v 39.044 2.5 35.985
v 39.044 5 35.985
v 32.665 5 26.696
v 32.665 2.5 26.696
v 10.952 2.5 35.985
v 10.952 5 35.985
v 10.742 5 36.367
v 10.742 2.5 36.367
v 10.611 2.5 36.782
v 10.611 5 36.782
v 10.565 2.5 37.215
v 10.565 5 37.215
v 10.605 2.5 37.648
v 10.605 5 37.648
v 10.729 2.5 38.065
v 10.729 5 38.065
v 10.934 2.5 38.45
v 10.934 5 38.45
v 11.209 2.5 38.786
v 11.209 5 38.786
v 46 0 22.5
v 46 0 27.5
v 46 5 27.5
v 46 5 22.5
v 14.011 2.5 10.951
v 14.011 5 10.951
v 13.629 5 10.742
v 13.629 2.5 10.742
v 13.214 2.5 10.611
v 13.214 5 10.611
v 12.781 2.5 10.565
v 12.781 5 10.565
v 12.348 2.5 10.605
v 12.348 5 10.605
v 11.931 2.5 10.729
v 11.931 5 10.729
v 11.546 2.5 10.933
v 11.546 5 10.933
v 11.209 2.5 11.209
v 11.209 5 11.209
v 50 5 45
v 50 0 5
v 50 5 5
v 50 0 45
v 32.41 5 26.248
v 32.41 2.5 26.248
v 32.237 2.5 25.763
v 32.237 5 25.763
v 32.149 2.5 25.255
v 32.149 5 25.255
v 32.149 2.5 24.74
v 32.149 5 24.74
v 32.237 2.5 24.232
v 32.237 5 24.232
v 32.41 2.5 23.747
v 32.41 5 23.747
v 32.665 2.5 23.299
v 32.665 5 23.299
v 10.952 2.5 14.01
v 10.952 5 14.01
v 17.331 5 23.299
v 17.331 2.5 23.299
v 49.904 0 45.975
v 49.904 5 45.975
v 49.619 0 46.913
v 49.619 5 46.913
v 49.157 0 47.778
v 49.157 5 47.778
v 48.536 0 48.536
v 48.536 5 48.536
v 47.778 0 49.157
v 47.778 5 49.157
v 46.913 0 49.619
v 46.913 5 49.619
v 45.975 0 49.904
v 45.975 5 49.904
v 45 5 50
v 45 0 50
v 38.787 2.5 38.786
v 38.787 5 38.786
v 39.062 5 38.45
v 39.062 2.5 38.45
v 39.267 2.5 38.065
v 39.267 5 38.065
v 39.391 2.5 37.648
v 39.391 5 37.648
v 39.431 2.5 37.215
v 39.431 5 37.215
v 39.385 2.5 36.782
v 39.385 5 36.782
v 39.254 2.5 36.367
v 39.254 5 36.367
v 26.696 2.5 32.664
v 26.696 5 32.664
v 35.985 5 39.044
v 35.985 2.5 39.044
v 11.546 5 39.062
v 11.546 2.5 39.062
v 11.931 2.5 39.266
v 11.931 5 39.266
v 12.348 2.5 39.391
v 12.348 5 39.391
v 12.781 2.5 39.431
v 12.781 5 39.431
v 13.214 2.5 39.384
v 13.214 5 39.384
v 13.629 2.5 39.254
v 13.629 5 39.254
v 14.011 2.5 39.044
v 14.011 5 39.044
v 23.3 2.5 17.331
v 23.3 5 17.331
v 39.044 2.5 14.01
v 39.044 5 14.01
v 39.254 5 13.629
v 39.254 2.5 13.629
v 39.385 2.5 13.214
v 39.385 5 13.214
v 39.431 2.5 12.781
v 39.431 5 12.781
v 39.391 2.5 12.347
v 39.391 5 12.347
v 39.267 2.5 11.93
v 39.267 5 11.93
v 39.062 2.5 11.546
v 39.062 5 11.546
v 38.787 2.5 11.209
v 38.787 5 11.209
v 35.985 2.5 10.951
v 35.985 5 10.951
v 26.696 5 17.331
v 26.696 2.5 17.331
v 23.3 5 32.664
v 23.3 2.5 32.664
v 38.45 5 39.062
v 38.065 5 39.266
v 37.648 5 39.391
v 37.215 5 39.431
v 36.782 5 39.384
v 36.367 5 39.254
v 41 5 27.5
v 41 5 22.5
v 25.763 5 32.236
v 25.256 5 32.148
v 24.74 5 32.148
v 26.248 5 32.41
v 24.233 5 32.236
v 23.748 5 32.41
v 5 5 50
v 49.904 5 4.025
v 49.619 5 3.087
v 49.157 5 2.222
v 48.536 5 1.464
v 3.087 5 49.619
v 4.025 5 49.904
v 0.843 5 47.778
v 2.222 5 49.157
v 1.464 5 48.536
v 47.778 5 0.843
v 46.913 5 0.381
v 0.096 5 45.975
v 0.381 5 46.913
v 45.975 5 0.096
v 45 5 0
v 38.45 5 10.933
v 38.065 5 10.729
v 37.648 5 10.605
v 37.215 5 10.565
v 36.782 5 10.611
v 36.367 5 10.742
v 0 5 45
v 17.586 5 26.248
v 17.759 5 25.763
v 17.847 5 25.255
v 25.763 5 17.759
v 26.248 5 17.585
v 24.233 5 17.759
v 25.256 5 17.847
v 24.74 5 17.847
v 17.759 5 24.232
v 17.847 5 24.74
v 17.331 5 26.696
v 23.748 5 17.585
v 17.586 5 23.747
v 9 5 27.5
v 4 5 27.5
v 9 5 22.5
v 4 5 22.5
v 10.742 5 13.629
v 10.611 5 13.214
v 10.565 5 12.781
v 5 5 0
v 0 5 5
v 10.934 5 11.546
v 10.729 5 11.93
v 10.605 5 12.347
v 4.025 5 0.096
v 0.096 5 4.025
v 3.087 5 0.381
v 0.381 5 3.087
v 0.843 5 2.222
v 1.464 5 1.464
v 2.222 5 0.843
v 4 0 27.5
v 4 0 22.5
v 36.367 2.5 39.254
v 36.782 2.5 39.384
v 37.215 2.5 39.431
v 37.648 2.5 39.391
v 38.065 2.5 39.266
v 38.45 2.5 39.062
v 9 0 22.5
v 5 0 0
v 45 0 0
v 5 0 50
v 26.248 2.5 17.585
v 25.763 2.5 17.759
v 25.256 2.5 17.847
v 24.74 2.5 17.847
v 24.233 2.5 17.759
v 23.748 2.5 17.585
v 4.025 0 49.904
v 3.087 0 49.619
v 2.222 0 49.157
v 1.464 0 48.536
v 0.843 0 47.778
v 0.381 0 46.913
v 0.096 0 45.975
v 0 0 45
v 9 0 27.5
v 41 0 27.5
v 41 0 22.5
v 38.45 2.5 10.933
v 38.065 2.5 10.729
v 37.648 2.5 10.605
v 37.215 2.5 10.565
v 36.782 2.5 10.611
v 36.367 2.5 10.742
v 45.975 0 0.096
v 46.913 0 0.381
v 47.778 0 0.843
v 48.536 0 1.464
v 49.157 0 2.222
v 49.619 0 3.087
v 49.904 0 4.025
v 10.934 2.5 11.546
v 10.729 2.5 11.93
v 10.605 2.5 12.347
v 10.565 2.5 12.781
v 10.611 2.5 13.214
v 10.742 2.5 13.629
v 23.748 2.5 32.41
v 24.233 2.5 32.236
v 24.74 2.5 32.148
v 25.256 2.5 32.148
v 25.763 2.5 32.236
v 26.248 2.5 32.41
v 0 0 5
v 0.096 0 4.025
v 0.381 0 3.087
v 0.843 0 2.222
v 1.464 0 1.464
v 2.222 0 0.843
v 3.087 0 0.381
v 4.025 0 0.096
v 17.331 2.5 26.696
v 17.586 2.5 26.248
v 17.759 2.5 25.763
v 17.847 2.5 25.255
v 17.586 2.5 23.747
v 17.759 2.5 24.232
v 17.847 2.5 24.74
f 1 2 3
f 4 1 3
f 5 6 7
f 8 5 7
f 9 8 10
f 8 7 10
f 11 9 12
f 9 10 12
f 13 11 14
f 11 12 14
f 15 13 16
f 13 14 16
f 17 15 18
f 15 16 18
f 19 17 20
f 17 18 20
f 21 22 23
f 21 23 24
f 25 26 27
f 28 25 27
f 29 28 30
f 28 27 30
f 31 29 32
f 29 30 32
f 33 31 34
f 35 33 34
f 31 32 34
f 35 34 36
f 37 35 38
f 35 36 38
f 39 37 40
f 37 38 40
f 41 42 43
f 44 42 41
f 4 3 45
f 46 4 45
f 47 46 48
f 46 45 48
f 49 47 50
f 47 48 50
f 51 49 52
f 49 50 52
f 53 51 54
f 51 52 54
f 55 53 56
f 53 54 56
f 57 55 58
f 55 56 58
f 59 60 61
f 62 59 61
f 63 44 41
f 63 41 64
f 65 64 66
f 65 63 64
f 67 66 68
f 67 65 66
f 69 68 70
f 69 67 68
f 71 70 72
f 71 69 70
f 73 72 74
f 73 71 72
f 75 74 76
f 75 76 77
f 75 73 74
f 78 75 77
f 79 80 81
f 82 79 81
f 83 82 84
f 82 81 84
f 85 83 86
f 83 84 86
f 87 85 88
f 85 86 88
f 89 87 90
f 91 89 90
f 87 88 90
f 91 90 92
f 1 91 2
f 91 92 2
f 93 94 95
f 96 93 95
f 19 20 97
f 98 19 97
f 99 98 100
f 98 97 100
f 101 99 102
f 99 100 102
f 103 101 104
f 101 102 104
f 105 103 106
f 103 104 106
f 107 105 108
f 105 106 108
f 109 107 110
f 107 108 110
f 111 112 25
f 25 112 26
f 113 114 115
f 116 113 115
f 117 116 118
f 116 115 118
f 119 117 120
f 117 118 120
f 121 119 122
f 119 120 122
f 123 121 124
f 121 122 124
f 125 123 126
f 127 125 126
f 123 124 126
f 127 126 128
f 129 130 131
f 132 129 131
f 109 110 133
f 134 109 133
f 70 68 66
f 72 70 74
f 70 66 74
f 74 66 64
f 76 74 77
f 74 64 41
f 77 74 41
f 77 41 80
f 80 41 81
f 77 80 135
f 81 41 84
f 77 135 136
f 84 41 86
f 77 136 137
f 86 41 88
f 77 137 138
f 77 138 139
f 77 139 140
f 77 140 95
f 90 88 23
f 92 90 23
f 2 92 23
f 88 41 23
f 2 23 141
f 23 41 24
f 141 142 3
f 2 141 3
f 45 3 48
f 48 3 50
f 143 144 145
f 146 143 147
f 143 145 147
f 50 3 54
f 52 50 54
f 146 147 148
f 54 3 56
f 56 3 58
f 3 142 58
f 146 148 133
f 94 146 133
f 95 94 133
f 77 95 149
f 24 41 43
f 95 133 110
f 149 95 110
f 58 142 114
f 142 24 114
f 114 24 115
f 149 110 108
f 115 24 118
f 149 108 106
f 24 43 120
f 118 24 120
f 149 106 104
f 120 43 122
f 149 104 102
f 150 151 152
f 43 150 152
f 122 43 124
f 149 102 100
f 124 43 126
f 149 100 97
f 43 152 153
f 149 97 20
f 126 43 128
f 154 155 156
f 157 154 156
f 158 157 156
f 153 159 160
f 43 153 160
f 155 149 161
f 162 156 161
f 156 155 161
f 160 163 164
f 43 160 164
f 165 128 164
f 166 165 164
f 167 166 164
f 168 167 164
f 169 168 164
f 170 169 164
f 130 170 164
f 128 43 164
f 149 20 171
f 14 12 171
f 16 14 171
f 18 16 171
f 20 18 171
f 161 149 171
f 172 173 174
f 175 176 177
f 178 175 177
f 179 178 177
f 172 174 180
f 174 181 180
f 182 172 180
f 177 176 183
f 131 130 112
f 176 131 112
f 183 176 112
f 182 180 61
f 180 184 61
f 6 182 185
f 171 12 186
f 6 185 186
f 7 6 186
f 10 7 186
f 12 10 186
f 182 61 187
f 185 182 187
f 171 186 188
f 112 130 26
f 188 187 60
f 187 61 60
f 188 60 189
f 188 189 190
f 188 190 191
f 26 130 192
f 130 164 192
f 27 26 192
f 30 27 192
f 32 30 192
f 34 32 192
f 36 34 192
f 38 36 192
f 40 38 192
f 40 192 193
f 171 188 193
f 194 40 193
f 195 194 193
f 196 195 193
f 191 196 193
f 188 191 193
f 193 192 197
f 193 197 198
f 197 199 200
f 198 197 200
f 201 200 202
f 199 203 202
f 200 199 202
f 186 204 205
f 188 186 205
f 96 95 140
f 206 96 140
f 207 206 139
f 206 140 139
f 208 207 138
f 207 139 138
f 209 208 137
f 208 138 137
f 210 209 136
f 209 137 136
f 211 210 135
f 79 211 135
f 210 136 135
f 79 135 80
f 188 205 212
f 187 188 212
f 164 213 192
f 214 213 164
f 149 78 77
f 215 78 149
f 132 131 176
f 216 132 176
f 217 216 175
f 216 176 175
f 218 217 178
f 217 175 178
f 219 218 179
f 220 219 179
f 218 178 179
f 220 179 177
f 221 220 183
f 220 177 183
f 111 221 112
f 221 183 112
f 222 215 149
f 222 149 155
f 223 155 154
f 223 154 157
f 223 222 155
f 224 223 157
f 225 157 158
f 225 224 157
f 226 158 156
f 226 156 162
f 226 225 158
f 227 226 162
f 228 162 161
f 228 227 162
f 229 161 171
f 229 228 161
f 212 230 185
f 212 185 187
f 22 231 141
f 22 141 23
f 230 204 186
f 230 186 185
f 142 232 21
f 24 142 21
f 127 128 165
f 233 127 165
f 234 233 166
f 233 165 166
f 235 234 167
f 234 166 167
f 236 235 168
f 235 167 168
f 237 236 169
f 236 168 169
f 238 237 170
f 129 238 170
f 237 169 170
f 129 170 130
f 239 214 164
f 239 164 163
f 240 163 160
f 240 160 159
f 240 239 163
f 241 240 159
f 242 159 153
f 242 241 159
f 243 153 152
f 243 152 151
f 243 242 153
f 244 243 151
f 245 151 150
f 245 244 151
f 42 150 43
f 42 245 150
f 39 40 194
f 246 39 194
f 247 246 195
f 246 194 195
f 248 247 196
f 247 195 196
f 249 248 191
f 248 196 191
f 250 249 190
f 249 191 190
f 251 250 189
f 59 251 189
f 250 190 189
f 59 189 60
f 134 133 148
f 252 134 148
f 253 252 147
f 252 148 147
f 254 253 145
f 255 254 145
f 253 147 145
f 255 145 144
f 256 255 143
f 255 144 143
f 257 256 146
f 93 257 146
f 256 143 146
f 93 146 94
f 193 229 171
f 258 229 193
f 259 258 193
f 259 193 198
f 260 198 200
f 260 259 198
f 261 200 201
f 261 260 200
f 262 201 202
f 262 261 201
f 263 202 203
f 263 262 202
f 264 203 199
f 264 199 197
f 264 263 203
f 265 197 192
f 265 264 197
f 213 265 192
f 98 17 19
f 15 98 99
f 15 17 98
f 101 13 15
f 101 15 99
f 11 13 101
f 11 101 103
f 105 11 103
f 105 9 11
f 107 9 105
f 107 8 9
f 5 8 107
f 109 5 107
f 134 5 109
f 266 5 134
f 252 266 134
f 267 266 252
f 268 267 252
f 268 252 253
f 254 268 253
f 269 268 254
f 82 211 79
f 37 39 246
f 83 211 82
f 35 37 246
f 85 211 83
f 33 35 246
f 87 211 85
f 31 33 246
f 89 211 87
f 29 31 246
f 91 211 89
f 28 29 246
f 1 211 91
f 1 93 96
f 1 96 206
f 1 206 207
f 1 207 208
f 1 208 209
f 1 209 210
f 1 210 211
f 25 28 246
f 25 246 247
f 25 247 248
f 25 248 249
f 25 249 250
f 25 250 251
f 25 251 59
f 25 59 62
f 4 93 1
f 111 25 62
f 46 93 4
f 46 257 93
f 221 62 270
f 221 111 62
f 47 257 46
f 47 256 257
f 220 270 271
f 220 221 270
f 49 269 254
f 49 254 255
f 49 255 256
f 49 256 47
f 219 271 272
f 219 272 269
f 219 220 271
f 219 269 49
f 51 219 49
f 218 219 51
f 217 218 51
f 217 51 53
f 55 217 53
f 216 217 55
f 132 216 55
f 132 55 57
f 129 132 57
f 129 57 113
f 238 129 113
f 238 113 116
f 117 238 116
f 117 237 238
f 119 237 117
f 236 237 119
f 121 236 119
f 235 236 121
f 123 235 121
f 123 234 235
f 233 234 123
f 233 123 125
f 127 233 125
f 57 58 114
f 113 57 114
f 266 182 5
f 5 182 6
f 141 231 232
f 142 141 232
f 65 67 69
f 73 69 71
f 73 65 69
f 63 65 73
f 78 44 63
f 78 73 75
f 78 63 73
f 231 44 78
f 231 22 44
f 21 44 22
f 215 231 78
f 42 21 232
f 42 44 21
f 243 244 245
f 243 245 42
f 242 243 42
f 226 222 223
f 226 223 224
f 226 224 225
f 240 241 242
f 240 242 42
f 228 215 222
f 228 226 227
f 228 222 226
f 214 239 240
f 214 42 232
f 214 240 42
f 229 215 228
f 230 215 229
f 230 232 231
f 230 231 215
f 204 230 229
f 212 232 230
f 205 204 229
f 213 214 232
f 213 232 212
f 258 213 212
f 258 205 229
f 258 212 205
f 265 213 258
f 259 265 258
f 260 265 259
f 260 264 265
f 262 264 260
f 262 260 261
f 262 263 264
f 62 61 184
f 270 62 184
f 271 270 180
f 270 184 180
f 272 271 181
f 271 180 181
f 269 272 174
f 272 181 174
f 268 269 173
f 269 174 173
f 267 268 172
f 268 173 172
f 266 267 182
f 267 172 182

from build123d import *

# Parameters (mm, degrees)
SKETCH2_W           = 5
SKETCH2_H           = 5
BOSS_EXTRUDE1_DEPTH = 5
CUT_EXTRUDE1_DEPTH  = 2.5


with BuildPart() as part:
    # Sketch2 → Boss-Extrude1 (new body)
    with BuildSketch(Plane(origin=(0, 0, 0), x_dir=(1, 0, 0), z_dir=(0, 1, 0))):
        with BuildLine():
            Line((5, 0), (45, 0))
            ThreePointArc((45, 0), (48.535533906, -1.464466094), (50, -5))
            Line((50, -5), (50, -45))
            ThreePointArc((50, -45), (48.535533906, -48.535533906), (45, -50))
            Line((45, -50), (5, -50))
            ThreePointArc((5, -50), (1.464466094, -48.535533906), (0, -45))
            Line((0, -45), (0, -5))
            ThreePointArc((0, -5), (1.464466094, -1.464466094), (5, 0))
        make_face()
        with Locations((6.5, -25)):
            Rectangle(SKETCH2_W, SKETCH2_H, mode=Mode.SUBTRACT)
        with Locations((43.5, -25)):
            Rectangle(SKETCH2_W, SKETCH2_H, mode=Mode.SUBTRACT)
    extrude(amount=BOSS_EXTRUDE1_DEPTH)

    # Sketch4 → Cut-Extrude1 (cut)
    with BuildSketch(Plane(origin=(0, 5, 0), x_dir=(1, 0, 0), z_dir=(0, 1, 0))):
        with BuildLine():
            Line((23.299566157, -17.331191341), (14.010613466, -10.951334614))
            ThreePointArc((14.010613466, -10.951334614), (12.563442924, -10.574062008), (11.209455823, -11.209165249))
            ThreePointArc((11.209455823, -11.209165249), (10.574352582, -12.56315235), (10.951625187, -14.010322893))
            Line((10.951625187, -14.010322893), (17.331481915, -23.299275583))
            ThreePointArc((17.331481915, -23.299275583), (17.858572583, -24.997719905), (17.331481915, -26.696164227))
            Line((17.331481915, -26.696164227), (10.951625187, -35.985116918))
            ThreePointArc((10.951625187, -35.985116918), (10.574352582, -37.43228746), (11.209455823, -38.786274561))
            ThreePointArc((11.209455823, -38.786274561), (12.563442924, -39.421377802), (14.010613466, -39.044105197))
            Line((14.010613466, -39.044105197), (23.299566157, -32.664248469))
            ThreePointArc((23.299566157, -32.664248469), (24.998010479, -32.137157801), (26.696454801, -32.664248469))
            Line((26.696454801, -32.664248469), (35.985407491, -39.044105197))
            ThreePointArc((35.985407491, -39.044105197), (37.432578034, -39.421377802), (38.786565135, -38.786274561))
            ThreePointArc((38.786565135, -38.786274561), (39.421668376, -37.43228746), (39.04439577, -35.985116918))
            Line((39.04439577, -35.985116918), (32.664539043, -26.696164227))
            ThreePointArc((32.664539043, -26.696164227), (32.137448374, -24.997719905), (32.664539043, -23.299275583))
            Line((32.664539043, -23.299275583), (39.04439577, -14.010322893))
            ThreePointArc((39.04439577, -14.010322893), (39.421668376, -12.56315235), (38.786565135, -11.209165249))
            ThreePointArc((38.786565135, -11.209165249), (37.432578034, -10.574062008), (35.985407491, -10.951334614))
            Line((35.985407491, -10.951334614), (26.696454801, -17.331191341))
            ThreePointArc((26.696454801, -17.331191341), (24.998010479, -17.85828201), (23.299566157, -17.331191341))
        make_face()
    extrude(amount=-CUT_EXTRUDE1_DEPTH, mode=Mode.SUBTRACT)


solid = part.part
